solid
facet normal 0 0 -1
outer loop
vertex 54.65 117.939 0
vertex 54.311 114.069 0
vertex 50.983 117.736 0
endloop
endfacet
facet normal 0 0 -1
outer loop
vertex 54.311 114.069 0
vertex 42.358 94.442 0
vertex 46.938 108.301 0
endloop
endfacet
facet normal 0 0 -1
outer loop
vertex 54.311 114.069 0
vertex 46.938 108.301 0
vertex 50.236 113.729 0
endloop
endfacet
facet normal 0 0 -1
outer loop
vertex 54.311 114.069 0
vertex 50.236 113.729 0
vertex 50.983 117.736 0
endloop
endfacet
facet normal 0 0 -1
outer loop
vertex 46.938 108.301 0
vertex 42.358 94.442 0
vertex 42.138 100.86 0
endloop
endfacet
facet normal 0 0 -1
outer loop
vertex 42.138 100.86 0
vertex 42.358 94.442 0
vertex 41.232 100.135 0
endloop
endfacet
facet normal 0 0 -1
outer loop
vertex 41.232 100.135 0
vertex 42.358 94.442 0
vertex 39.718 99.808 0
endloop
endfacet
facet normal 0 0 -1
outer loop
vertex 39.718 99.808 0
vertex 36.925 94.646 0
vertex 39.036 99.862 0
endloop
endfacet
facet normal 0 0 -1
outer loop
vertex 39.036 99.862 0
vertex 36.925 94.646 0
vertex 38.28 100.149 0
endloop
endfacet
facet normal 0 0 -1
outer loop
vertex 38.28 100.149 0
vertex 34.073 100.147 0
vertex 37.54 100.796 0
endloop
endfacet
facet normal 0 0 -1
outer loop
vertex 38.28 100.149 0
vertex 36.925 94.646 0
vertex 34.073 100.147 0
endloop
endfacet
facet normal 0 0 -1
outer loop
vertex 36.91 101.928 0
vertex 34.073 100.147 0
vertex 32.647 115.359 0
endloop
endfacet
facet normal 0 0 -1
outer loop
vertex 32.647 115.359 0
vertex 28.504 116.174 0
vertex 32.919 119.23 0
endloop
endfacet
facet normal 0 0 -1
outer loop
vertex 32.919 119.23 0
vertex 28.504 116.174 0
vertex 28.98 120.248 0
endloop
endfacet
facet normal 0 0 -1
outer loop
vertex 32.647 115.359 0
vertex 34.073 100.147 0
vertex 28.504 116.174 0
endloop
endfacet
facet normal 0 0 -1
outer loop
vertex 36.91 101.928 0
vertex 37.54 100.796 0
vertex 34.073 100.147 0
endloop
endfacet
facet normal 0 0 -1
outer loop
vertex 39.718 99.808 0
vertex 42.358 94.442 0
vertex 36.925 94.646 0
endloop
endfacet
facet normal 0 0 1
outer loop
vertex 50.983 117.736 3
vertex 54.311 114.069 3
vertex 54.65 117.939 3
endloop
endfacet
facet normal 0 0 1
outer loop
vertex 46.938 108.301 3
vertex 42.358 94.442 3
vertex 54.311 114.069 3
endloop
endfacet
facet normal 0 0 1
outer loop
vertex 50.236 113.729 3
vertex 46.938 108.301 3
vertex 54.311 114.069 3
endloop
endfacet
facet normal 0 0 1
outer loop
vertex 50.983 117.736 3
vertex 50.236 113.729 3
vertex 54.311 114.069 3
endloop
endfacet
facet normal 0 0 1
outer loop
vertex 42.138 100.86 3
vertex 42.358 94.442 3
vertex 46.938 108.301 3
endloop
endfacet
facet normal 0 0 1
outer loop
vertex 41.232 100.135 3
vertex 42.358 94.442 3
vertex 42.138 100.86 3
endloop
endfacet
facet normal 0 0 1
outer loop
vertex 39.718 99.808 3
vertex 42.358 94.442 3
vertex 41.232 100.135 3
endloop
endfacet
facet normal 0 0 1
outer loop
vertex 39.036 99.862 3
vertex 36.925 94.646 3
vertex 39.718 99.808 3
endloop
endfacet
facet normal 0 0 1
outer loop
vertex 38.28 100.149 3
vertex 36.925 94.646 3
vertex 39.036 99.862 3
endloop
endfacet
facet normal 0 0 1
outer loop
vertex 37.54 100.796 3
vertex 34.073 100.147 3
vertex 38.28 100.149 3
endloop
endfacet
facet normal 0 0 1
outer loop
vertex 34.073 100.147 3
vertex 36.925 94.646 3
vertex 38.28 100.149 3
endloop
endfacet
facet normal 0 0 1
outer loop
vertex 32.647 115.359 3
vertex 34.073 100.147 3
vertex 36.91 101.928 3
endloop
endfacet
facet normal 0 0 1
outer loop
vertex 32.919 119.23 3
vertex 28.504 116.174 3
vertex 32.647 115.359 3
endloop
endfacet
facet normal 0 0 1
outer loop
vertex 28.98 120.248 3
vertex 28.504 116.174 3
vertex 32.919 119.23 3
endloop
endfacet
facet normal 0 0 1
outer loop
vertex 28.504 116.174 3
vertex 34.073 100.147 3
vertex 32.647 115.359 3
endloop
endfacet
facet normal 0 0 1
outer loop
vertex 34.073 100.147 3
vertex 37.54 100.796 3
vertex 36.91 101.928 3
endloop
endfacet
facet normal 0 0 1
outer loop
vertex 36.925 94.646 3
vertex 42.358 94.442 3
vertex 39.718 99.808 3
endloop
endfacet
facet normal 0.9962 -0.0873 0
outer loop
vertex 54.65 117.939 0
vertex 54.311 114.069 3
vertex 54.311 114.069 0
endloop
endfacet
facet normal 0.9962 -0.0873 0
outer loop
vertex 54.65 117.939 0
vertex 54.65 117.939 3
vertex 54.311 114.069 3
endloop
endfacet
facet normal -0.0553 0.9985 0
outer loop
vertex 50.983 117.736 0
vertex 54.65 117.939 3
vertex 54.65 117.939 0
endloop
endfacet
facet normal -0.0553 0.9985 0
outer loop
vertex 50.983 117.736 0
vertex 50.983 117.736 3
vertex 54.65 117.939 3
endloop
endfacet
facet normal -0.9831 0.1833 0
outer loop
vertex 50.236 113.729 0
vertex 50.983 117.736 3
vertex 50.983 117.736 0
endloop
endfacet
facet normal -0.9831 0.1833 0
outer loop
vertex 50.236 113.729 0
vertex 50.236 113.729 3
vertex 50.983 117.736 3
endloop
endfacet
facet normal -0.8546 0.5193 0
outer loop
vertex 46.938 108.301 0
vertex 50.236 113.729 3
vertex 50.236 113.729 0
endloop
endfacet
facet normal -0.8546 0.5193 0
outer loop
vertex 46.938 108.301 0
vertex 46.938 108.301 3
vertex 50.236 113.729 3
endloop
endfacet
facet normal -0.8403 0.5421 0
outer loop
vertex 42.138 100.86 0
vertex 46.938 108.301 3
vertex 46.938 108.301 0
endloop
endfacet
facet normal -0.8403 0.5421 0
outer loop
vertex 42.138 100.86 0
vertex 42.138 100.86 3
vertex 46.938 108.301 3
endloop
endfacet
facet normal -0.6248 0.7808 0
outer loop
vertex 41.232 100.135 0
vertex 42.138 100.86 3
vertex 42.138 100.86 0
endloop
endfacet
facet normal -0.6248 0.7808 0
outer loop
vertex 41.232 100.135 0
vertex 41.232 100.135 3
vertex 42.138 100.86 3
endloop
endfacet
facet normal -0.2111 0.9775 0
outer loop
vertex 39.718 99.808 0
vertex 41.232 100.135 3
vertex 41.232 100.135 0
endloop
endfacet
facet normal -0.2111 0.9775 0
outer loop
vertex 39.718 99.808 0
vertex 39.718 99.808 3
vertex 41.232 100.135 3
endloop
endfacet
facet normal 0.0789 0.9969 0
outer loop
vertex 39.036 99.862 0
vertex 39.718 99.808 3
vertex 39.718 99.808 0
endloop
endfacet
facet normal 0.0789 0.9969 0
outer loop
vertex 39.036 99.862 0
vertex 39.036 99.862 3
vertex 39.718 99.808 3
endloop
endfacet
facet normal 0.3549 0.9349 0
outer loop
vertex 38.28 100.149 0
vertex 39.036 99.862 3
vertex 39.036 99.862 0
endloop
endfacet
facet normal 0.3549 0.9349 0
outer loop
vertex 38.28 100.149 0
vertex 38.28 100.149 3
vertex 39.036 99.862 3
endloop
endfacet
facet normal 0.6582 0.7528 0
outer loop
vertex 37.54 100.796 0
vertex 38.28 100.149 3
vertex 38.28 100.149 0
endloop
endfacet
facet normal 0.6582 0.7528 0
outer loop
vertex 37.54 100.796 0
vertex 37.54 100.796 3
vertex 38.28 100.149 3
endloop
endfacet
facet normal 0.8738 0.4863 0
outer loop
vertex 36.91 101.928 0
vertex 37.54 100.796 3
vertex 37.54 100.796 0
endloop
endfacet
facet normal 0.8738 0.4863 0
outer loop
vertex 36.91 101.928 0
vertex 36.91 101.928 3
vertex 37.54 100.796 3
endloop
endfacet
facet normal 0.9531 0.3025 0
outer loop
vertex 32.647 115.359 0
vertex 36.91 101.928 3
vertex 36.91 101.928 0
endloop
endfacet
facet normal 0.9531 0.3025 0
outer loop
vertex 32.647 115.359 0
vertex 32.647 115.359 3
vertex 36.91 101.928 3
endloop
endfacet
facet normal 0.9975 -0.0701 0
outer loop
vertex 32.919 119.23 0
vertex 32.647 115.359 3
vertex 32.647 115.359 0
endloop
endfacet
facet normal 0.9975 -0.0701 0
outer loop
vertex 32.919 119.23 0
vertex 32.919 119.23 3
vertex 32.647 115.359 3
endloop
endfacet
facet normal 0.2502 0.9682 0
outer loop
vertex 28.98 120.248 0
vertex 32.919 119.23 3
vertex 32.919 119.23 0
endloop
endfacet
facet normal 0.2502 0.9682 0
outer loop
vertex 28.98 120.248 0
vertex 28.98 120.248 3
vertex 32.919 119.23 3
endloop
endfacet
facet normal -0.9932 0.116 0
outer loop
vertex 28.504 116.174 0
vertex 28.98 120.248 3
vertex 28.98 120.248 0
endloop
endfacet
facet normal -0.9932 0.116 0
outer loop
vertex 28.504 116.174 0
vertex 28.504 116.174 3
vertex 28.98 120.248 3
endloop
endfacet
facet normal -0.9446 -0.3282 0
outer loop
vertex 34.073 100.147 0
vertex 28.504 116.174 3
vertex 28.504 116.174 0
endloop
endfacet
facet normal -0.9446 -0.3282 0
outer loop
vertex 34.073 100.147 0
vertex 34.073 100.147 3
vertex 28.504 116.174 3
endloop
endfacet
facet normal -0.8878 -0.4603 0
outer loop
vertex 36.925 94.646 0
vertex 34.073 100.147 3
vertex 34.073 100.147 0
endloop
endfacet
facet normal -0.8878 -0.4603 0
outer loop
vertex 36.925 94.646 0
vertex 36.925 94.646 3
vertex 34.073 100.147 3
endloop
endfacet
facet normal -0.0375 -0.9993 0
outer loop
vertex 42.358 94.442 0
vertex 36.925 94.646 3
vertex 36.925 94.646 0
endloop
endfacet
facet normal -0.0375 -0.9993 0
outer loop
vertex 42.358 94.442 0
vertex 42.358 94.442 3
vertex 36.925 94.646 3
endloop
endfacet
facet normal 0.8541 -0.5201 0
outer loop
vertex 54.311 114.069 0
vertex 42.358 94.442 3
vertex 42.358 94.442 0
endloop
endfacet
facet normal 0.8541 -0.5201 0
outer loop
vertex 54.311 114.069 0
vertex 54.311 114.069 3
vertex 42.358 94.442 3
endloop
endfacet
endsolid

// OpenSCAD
height_strut = 3.000000000;

center_strut_1 = [41.577381000,107.345240000];
size_strut_1 = [26.145856000,25.806140000];
stroke_width_strut_1 = 0.400000150;
// paths for strut_1
points_strut_1_1 = [ [-12.597406000,12.903070000],[-8.658543000,11.884380000],[-8.930188000,8.013450000],[-4.667562000,-5.417210000],[-4.037136828,-6.549092656],[-3.297747625,-7.195853750],[-2.541113859,-7.483332969],[-1.858955000,-7.537370000],[-0.345299125,-7.210000000],[0.560280000,-6.485460000],[5.360847750,0.956072500],[8.658687000,6.383720000],[9.405728000,10.390470000],[13.072928000,10.594210000],[12.733314000,6.723270000],[0.780934000,-12.903070000],[-4.651956000,-12.699340000],[-7.504220000,-7.198520000],[-13.072928000,8.828520000],[-12.597406000,12.903070000] ];

module polygon_strut_1() {
 linear_extrude(height=height_strut) {
  polygon(points=points_strut_1_1);
 }
}

translate(center_strut_1) polygon_strut_1();
